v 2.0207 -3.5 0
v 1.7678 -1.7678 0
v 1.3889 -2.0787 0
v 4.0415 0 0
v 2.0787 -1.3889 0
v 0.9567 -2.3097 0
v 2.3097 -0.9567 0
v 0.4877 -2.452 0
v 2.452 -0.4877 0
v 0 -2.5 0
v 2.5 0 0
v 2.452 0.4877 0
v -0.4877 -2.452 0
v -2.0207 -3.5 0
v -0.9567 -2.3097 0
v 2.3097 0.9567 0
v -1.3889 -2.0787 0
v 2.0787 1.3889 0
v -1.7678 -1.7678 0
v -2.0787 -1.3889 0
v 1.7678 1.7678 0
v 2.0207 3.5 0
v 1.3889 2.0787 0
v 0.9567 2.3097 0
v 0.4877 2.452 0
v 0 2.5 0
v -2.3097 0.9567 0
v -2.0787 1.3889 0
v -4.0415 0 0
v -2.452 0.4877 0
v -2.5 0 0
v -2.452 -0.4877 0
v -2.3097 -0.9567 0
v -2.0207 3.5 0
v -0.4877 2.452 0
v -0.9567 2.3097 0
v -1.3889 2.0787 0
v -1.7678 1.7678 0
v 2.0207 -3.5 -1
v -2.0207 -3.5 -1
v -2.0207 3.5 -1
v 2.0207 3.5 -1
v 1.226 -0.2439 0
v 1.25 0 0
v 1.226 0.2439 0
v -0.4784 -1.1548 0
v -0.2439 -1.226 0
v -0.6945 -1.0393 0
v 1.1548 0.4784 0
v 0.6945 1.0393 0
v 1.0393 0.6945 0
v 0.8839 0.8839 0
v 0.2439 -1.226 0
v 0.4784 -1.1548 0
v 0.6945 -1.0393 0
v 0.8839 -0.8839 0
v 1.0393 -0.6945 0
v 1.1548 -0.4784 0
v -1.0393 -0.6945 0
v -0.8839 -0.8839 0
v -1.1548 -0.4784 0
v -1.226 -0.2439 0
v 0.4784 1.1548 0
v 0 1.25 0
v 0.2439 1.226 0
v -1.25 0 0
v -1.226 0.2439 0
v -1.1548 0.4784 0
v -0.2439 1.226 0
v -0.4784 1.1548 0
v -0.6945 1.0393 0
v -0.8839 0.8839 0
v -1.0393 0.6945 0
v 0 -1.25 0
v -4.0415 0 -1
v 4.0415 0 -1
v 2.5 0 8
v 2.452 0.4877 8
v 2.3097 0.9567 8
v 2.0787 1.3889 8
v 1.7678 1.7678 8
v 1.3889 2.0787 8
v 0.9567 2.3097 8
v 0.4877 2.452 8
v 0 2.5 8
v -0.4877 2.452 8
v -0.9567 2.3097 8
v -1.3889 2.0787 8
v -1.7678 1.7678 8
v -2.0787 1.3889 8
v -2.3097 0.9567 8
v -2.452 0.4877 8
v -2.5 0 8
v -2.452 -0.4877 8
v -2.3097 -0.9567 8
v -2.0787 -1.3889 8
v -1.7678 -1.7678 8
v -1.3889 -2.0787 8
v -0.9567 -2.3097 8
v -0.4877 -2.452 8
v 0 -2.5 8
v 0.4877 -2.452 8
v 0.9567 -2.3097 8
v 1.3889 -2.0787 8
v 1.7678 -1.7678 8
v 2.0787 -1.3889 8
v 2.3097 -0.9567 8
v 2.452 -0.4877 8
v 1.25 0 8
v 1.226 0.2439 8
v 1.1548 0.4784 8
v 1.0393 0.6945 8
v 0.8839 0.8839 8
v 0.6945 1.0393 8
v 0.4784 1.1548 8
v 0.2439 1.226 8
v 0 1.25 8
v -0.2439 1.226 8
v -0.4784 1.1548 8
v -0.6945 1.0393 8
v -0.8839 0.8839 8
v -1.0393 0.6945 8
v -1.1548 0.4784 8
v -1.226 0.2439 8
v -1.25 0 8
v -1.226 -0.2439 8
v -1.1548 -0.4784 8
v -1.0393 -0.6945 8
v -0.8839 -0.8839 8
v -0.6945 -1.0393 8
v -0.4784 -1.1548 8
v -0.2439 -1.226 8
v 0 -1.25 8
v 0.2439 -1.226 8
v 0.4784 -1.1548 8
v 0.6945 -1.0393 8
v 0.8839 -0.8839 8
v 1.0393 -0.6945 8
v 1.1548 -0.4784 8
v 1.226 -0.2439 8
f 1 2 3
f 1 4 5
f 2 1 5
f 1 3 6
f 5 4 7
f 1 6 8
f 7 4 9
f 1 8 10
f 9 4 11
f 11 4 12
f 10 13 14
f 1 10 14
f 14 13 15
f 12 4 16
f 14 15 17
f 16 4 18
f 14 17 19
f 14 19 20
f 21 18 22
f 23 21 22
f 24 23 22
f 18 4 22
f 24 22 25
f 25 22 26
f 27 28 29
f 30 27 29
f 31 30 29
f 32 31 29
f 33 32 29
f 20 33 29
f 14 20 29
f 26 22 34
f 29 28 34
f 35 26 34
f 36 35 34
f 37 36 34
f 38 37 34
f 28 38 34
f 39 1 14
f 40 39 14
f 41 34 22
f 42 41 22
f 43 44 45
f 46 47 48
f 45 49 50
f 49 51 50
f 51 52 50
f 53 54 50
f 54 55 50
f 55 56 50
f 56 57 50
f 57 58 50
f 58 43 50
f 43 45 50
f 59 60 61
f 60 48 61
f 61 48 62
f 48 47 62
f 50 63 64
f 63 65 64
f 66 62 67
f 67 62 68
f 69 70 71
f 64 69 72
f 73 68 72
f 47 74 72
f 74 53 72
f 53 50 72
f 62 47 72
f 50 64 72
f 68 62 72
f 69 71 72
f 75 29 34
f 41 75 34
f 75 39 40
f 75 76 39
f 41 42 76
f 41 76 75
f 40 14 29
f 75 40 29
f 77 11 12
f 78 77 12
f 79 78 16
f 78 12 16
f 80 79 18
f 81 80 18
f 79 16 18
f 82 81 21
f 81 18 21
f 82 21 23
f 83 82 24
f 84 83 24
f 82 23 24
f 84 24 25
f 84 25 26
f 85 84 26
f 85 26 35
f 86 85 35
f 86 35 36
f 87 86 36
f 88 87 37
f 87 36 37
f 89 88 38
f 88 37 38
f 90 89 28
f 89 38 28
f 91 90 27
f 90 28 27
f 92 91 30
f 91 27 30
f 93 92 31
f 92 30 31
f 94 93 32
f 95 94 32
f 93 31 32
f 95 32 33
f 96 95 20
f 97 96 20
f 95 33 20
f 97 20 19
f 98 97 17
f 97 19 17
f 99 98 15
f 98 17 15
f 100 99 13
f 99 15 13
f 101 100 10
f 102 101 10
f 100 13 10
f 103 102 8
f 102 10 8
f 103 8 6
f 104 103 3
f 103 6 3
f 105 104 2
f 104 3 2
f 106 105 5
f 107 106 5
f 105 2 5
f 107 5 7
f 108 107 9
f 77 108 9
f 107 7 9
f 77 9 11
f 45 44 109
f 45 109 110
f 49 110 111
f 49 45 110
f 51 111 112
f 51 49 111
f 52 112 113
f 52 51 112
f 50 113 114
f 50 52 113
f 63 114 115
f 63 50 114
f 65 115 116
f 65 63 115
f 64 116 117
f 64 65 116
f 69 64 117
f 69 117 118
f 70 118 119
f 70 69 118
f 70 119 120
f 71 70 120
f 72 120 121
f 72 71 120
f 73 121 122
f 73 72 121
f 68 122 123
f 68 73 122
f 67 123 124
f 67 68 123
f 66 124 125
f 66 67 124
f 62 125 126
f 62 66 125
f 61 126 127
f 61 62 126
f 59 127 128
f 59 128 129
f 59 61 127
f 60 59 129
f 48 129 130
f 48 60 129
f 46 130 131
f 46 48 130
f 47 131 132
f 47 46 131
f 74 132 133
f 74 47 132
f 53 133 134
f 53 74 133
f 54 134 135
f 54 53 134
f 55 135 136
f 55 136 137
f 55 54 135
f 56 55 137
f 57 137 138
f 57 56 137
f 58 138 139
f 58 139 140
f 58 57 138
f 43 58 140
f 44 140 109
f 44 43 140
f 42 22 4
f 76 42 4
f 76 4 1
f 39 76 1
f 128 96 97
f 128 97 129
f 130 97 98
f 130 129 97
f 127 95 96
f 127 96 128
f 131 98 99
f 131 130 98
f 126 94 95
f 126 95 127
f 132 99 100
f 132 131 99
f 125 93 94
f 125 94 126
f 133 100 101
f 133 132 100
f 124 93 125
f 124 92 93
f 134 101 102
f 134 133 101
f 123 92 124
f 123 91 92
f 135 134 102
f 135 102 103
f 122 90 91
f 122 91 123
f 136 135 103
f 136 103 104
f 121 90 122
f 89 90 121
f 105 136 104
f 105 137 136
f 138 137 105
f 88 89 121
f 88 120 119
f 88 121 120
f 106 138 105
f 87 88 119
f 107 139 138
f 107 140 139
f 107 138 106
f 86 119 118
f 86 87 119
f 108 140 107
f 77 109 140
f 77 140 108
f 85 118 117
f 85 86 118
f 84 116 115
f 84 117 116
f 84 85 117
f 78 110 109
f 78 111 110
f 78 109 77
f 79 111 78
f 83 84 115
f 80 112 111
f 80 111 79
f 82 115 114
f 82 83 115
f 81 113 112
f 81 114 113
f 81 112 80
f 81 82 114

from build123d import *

# Parameters (mm, degrees)
SKETCH_1_R      = 2.5
SKETCH_1_R_2    = 1.25
EXTRUDE_1_DEPTH = 8
EXTRUDE_2_DEPTH = 1


with BuildPart() as part:
    # 草图1 → 凸台-拉伸1 (new body)
    with BuildSketch(Plane.XY):
        Circle(SKETCH_1_R)
        Circle(SKETCH_1_R_2, mode=Mode.SUBTRACT)
    extrude(amount=EXTRUDE_1_DEPTH)

    # 草图2 → 凸台-拉伸2 (add)
    with BuildSketch(Plane(origin=(0, 0, 0), x_dir=(-1, 0, 0), z_dir=(0, 0, -1))):
        Polygon((-2.020725942, -3.5), (2.020725942, -3.5), (4.041451884, 0), (2.020725942, 3.5), (-2.020725942, 3.5), (-4.041451884, 0), align=None)
    extrude(amount=EXTRUDE_2_DEPTH)


solid = part.part
